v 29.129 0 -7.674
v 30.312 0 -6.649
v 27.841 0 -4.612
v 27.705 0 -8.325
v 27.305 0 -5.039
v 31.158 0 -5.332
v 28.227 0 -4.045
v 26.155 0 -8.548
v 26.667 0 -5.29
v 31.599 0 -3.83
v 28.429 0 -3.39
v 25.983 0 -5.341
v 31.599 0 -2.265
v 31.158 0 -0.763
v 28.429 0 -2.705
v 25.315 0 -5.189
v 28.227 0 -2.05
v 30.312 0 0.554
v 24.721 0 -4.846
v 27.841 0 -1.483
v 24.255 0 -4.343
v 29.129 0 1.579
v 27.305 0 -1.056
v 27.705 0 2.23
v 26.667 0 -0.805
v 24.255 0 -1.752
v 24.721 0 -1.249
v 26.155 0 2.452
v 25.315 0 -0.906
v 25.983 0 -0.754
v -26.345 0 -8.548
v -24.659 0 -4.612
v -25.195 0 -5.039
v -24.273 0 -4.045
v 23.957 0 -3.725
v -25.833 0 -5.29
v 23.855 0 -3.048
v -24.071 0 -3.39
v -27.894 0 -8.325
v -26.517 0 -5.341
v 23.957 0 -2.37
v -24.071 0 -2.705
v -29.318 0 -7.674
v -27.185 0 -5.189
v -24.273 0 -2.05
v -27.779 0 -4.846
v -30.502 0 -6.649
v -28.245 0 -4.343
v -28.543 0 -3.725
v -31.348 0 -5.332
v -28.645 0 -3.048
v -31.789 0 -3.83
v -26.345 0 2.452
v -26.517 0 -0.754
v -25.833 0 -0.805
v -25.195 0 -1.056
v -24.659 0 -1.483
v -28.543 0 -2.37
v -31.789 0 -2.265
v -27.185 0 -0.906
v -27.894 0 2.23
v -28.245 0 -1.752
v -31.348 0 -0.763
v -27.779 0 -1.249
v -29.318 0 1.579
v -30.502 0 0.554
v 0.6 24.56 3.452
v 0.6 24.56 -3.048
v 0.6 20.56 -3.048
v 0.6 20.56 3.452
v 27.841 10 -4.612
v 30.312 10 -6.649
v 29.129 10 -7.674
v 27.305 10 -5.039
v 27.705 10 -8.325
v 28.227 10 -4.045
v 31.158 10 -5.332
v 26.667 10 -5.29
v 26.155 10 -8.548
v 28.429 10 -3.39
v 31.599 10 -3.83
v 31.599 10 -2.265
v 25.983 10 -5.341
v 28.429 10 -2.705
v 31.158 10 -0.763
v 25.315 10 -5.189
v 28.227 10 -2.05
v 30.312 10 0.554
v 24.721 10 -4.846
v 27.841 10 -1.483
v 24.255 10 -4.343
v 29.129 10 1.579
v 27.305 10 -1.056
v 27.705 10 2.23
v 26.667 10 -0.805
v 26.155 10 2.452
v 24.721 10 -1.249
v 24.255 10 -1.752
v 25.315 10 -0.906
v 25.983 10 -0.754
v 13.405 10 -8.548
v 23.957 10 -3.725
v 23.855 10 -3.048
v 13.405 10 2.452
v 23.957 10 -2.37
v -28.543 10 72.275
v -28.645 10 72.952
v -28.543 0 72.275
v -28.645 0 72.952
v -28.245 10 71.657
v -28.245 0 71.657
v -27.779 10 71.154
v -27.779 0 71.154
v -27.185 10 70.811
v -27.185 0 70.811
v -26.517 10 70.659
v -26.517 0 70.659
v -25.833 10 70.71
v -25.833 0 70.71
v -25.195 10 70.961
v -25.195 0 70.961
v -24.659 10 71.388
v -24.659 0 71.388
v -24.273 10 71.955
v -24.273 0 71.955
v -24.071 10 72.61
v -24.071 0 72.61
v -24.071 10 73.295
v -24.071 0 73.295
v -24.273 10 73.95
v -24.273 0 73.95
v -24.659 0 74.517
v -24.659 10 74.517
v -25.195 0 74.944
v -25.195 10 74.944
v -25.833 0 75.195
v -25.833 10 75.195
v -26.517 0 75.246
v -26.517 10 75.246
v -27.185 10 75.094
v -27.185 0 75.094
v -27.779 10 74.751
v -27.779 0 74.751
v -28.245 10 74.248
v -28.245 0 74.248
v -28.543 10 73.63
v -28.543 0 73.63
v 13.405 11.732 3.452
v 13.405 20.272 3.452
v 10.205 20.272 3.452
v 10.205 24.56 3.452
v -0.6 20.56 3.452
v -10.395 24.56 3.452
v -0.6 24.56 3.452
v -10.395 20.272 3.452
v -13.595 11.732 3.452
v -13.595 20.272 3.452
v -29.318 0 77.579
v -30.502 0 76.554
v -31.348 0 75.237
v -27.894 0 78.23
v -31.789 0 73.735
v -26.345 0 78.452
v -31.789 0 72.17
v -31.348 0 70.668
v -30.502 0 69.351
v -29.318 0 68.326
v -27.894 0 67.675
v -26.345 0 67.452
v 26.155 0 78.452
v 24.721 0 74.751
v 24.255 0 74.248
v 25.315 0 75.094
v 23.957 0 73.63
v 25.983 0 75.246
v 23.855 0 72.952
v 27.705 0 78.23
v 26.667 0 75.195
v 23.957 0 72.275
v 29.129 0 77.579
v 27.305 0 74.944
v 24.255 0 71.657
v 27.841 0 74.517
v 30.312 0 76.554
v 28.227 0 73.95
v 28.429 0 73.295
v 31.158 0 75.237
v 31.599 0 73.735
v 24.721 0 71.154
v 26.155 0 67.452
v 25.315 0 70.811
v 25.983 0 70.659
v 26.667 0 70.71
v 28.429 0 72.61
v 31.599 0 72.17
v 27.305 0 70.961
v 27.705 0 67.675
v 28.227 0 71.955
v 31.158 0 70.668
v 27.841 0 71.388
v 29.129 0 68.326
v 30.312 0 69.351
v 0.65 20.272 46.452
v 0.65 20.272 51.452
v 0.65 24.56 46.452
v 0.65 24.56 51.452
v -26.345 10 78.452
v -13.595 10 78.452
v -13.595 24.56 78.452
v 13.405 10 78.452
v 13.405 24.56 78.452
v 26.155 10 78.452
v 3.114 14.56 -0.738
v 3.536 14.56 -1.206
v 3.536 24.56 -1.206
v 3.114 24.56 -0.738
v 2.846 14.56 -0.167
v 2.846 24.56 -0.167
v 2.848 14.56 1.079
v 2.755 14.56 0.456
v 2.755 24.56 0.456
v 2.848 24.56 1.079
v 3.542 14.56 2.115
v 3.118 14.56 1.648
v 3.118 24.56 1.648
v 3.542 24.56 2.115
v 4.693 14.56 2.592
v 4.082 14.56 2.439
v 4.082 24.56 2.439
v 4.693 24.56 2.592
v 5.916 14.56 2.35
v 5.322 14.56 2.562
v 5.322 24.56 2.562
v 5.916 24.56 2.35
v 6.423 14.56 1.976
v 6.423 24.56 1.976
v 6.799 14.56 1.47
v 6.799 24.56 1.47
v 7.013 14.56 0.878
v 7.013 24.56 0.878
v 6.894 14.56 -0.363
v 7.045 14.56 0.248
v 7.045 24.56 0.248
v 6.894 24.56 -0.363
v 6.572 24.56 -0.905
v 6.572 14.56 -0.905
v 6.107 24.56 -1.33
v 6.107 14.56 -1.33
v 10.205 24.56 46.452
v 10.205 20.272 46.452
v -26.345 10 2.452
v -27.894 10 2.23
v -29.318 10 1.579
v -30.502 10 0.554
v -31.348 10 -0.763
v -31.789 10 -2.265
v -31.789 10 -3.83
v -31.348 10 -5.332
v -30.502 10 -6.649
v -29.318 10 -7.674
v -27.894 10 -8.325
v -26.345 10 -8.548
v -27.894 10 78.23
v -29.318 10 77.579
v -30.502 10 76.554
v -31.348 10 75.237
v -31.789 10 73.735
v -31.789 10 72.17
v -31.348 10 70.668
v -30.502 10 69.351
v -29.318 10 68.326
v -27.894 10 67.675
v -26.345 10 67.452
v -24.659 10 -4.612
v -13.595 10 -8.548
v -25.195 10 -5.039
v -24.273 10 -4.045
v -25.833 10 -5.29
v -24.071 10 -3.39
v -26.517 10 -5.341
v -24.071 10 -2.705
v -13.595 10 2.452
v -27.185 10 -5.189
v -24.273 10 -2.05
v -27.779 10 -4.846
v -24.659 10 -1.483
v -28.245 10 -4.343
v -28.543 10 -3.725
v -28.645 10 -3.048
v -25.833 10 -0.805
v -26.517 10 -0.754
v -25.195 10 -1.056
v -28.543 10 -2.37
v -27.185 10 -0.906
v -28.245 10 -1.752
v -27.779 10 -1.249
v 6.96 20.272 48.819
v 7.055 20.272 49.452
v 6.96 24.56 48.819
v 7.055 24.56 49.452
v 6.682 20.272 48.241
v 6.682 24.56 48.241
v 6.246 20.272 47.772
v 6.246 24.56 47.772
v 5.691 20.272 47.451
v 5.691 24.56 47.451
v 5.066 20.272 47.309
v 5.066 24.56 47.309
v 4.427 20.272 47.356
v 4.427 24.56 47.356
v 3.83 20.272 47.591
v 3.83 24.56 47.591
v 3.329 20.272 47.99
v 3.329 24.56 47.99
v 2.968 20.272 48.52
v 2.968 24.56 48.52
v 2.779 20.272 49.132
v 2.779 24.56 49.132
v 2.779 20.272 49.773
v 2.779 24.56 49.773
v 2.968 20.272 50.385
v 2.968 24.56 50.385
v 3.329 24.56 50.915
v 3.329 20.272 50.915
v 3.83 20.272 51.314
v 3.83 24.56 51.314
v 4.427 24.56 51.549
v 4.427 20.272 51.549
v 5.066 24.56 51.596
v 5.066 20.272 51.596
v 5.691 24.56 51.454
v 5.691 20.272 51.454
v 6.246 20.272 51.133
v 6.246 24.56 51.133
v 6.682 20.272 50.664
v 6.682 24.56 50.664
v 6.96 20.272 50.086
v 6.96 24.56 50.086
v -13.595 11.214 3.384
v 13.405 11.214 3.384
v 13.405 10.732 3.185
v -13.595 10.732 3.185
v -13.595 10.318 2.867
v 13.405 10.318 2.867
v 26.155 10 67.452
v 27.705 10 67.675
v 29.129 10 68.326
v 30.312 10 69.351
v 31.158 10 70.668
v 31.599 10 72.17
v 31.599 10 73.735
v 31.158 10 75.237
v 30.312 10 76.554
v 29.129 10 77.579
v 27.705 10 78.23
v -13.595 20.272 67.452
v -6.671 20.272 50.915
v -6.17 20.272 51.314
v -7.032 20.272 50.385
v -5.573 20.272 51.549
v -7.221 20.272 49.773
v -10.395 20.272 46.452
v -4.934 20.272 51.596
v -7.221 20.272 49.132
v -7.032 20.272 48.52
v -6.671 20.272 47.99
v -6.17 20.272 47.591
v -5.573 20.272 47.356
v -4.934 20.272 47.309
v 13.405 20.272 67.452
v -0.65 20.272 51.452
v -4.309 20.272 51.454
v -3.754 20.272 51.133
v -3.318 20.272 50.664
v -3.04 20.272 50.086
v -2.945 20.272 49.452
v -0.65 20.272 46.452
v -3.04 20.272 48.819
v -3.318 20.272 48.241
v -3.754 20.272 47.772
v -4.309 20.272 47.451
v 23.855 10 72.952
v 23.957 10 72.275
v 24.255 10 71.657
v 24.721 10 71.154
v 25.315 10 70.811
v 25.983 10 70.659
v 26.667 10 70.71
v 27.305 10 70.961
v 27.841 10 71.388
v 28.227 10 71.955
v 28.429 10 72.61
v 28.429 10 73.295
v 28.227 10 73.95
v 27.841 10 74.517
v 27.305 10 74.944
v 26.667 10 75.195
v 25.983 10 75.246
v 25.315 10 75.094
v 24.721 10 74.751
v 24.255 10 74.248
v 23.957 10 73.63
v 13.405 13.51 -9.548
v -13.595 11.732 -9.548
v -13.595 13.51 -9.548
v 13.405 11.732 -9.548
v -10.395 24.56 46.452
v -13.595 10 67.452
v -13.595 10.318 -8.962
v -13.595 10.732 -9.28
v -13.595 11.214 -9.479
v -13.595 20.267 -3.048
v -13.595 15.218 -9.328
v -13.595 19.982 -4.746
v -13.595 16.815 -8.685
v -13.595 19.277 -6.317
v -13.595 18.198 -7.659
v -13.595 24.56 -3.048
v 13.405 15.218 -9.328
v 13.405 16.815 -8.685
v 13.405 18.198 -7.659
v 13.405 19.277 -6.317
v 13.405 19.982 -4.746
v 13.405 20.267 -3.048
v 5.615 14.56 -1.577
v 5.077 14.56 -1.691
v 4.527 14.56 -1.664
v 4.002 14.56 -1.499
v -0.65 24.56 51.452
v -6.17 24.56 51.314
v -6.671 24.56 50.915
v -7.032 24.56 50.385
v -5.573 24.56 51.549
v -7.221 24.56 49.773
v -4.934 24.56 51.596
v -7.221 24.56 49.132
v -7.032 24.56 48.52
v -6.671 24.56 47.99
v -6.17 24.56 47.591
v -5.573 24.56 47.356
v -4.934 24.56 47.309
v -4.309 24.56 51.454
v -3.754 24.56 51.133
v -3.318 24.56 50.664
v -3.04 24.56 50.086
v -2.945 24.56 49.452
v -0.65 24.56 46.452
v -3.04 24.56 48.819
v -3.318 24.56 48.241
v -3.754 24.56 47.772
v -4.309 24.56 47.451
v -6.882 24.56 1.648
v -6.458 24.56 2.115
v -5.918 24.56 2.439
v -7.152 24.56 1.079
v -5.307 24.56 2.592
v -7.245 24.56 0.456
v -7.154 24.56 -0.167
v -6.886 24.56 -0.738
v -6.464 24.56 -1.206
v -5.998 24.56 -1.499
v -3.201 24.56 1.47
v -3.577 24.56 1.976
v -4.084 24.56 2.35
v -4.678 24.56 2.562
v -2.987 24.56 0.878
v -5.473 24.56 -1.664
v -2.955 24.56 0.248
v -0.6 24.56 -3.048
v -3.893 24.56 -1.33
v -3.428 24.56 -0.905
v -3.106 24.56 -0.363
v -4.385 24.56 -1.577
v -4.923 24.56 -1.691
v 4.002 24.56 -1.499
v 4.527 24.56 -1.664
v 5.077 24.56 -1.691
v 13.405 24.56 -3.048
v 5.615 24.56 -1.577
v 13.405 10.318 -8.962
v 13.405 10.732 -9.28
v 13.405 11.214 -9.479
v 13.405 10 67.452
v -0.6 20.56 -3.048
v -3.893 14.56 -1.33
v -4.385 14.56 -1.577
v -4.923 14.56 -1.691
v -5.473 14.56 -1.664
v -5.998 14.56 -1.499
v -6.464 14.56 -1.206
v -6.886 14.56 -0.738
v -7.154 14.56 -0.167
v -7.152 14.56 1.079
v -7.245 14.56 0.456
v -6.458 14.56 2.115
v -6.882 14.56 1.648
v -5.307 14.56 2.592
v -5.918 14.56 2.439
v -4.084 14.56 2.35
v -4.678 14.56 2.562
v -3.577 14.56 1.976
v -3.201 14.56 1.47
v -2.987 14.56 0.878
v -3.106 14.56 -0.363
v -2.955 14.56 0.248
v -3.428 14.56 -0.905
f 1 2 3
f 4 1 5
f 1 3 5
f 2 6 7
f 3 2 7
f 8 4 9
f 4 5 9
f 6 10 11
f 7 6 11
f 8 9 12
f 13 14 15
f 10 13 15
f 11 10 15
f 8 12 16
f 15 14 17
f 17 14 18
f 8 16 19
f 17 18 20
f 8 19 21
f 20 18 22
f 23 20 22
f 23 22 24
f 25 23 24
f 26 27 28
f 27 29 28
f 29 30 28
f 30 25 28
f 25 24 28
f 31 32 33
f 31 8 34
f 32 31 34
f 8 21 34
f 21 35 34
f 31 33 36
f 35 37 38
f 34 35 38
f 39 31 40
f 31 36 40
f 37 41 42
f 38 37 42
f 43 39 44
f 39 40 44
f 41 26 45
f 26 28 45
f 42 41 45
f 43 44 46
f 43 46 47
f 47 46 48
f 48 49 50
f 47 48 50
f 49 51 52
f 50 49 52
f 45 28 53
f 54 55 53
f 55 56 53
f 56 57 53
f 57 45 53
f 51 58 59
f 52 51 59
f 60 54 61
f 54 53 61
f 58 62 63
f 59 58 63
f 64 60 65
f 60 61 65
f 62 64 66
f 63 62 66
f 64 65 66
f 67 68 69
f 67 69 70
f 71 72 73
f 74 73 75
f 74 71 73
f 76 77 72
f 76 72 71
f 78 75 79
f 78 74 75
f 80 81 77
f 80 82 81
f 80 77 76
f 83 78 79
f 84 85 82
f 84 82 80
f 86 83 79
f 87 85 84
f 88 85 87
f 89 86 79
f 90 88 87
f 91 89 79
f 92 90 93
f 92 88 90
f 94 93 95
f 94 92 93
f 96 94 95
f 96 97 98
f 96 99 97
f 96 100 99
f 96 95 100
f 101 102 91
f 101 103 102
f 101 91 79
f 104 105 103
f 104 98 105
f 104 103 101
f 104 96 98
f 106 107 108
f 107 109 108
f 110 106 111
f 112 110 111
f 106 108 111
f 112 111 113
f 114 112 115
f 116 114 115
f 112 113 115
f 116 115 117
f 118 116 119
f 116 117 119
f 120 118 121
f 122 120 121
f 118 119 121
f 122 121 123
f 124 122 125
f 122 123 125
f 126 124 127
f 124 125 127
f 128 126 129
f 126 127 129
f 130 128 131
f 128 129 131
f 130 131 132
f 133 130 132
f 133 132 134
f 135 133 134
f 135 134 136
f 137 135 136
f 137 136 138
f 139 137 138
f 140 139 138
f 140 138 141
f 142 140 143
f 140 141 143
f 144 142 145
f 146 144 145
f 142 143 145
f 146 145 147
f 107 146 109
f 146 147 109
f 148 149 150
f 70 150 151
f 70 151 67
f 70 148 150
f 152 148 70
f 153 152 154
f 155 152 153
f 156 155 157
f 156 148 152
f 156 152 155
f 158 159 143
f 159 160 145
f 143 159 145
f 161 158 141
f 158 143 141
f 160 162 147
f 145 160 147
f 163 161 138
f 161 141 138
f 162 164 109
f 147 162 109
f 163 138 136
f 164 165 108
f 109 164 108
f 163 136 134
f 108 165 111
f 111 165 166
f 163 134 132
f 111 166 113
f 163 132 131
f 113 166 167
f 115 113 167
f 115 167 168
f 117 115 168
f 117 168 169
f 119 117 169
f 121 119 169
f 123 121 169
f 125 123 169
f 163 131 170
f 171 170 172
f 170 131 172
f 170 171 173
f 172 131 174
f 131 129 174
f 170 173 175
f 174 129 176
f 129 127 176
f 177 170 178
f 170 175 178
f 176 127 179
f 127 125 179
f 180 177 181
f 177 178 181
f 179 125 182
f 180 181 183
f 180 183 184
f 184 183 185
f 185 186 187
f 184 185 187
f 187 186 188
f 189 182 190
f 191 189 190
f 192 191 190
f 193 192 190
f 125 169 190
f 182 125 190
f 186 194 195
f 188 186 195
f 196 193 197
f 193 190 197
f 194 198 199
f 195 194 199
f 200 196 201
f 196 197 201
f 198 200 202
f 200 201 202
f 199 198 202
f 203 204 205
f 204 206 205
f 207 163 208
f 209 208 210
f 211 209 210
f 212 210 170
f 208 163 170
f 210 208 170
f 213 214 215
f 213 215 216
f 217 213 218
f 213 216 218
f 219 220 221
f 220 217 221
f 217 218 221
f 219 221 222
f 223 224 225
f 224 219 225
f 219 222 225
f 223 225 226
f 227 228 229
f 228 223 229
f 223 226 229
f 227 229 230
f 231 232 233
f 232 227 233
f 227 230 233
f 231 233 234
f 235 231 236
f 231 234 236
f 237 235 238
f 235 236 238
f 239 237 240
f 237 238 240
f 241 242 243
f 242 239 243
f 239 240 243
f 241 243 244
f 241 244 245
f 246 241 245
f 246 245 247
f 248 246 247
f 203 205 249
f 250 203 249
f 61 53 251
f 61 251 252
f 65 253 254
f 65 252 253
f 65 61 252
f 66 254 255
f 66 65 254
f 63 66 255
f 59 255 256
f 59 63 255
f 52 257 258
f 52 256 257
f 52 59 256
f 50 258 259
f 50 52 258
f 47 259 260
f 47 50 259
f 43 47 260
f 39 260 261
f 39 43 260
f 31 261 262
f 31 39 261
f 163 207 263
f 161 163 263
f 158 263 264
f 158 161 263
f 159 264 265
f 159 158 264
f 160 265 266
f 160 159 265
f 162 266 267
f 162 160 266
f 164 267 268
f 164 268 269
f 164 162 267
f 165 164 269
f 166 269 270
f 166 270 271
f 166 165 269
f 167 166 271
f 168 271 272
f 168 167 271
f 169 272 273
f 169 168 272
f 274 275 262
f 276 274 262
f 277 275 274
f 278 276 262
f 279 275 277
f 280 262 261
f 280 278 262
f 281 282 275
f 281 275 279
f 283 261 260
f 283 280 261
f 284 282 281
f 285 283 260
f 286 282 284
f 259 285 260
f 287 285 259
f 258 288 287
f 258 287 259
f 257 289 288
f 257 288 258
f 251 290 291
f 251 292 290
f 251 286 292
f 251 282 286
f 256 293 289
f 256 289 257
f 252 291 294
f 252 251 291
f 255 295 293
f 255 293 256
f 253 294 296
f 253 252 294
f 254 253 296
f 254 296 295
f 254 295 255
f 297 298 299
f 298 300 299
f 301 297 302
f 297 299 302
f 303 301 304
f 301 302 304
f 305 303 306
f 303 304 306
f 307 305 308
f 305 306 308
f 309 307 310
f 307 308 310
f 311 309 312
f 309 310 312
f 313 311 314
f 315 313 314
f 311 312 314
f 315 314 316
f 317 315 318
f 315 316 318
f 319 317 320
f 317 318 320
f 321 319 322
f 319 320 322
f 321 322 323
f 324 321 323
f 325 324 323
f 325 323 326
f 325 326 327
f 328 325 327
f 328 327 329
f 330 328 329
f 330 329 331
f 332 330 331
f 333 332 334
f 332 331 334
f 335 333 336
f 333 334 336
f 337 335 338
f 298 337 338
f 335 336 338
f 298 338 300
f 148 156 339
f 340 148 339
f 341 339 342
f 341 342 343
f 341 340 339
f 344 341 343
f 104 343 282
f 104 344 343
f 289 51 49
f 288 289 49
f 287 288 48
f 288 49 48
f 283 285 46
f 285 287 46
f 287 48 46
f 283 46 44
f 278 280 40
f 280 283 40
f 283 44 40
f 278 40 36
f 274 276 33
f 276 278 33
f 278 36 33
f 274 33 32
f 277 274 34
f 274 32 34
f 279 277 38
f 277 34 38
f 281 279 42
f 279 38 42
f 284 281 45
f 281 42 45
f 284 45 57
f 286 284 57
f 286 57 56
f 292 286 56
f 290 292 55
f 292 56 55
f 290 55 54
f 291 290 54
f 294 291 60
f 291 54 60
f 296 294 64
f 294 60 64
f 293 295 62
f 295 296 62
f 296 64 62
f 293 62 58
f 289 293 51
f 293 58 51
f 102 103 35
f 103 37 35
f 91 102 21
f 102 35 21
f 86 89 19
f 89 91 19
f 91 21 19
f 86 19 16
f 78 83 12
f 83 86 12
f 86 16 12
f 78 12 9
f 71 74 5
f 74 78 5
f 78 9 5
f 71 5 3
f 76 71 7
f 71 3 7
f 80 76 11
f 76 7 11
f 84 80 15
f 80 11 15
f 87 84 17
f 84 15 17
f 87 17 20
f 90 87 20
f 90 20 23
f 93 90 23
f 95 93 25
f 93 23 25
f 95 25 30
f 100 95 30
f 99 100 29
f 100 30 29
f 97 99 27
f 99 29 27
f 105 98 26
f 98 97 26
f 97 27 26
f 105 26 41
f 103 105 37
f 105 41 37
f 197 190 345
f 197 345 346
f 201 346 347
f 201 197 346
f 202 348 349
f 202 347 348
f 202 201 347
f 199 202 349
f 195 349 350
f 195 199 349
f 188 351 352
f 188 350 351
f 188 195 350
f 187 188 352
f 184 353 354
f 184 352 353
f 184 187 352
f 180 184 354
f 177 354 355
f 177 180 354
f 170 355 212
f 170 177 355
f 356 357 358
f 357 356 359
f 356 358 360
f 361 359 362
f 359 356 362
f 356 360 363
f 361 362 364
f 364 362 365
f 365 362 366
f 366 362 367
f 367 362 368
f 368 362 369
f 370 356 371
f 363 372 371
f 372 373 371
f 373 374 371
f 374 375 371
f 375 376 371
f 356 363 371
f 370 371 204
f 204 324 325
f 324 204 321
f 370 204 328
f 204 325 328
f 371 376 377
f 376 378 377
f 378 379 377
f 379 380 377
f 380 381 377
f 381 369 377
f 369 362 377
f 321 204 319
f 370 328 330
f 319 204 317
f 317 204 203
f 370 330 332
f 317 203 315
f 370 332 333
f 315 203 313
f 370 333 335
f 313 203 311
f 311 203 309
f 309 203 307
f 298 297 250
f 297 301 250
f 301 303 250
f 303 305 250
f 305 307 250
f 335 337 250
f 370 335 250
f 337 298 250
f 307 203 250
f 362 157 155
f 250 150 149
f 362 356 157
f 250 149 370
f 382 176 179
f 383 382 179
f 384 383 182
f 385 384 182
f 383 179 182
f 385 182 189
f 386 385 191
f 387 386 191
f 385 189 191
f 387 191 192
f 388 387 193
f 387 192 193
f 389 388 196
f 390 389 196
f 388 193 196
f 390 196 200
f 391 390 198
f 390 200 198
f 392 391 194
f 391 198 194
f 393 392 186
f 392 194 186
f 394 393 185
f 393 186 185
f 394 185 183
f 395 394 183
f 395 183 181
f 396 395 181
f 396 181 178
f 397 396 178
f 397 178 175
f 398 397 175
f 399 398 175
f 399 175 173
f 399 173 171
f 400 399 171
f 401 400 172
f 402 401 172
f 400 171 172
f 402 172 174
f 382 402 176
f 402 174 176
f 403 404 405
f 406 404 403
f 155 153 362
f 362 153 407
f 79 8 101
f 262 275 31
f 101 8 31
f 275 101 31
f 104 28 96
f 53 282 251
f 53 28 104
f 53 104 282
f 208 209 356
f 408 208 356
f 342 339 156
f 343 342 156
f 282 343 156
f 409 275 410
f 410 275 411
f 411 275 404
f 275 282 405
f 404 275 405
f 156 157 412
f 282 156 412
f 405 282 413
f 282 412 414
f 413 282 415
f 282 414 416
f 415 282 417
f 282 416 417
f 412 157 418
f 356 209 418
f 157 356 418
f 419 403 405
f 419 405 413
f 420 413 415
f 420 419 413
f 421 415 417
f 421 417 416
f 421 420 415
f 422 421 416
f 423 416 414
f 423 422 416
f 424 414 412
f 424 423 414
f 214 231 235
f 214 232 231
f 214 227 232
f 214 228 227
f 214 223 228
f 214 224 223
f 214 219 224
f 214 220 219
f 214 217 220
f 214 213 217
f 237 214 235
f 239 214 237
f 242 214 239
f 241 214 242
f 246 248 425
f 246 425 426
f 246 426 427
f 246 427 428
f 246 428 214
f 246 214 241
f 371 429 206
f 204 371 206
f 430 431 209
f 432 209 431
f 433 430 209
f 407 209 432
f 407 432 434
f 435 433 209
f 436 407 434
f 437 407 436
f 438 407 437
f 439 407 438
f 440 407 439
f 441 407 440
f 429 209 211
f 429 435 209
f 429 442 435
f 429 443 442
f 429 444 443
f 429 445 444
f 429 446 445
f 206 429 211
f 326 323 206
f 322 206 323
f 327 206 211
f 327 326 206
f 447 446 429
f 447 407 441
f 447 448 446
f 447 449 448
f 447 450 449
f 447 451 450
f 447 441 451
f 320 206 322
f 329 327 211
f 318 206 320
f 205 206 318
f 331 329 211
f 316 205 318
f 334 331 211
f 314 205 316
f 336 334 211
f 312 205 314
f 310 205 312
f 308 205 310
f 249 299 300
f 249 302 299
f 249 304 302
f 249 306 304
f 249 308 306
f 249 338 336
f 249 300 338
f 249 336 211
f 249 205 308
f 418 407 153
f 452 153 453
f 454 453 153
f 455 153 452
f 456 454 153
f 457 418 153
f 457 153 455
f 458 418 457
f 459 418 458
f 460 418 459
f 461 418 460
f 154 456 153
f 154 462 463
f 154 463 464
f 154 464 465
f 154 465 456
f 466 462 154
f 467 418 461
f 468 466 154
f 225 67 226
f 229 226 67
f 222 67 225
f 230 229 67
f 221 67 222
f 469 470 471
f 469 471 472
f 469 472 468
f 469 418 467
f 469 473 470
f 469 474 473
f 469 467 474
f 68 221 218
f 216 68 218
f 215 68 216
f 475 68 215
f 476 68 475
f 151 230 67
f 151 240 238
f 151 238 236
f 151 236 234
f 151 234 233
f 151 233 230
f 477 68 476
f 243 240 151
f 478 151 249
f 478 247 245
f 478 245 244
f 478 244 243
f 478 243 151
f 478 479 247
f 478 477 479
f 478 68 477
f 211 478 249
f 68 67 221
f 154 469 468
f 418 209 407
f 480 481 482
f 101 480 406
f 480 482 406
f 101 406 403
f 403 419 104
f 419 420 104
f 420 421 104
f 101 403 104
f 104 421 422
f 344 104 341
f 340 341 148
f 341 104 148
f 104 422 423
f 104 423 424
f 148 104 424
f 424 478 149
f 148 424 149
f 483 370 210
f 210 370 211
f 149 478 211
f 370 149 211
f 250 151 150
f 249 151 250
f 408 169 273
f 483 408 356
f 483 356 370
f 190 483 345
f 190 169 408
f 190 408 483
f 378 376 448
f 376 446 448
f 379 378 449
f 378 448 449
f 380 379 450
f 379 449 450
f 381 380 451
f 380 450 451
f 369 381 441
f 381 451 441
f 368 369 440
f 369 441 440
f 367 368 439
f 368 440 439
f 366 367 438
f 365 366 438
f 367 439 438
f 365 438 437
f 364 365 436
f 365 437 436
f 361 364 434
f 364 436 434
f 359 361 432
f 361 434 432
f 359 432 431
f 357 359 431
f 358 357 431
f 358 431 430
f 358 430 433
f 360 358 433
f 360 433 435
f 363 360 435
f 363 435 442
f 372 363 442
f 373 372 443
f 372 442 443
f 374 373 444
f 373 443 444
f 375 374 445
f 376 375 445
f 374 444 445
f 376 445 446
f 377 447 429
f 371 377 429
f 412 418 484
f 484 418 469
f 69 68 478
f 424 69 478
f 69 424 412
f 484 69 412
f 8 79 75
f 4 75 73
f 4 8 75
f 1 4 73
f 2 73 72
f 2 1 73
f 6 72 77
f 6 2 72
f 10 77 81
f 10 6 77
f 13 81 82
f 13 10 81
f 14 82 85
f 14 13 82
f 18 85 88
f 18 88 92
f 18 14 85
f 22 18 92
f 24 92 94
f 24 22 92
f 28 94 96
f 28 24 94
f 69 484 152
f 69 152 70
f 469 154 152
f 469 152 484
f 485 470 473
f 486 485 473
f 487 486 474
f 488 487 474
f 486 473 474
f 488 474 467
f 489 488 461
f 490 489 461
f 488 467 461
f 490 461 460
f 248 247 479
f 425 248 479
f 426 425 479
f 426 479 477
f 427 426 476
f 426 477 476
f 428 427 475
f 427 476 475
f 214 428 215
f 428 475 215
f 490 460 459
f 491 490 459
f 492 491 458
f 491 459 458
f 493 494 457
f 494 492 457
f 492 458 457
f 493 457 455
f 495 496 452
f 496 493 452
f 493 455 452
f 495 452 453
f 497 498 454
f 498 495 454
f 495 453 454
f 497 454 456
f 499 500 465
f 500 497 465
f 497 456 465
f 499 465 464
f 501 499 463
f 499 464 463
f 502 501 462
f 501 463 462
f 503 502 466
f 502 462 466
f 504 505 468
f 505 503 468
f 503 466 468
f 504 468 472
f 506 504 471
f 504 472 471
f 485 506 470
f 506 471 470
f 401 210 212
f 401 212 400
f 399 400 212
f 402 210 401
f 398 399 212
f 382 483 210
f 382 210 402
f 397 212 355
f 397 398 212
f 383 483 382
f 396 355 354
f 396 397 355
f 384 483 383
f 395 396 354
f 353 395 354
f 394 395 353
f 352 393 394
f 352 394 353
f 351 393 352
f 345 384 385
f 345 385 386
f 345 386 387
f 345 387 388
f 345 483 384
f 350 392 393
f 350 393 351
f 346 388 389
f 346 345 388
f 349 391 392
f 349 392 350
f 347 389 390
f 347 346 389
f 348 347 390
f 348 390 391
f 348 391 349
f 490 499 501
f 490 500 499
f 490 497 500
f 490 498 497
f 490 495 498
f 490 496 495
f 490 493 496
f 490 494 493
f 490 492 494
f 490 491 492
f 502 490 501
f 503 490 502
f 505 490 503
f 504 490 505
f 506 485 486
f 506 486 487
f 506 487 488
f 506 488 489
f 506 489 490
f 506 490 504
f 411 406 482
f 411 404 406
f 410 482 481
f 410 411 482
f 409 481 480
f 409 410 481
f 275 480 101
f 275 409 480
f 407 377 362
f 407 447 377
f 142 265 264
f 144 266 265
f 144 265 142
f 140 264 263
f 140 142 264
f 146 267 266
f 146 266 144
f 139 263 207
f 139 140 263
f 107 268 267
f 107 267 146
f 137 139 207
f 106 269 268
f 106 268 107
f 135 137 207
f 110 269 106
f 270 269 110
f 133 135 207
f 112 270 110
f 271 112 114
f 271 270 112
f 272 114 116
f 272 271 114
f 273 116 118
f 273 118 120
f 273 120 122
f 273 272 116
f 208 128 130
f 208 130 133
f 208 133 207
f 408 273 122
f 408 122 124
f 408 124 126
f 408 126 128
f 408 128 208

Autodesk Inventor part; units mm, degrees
ref_plane "YZ Plane" through (0, 0, 0) normal (1, 0, 0) x (0, 1, 0)
ref_plane "XZ Plane" through (0, 0, 0) normal (0, 1, 0) x (-1, 0, 0)
ref_plane "XY Plane" through (0, 0, 0) normal (0, 0, 1) x (1, 0, 0)
sketch "Sketch1" plane through (0, 0, 0) normal (0, 1, 0) x (-1, 0, 0)
  circle A0 centre (-26.1551, -3.0475) radius 2.3
  arc A1 (-34.9051, -0.0475) -> (-17.4051, -0.0475) centre (-26.1551, -0.0475) ccw
  arc A2 (17.5949, -0.0475) -> (35.0949, -0.0475) centre (26.3449, -0.0475) ccw
  circle A3 centre (26.3449, -3.0475) radius 2.3
  circle A4 centre (-26.1551, -3.0475) radius 2.3
  circle A5 centre (26.3449, -3.0475) radius 2.3
  circle A6 centre (26.3449, -0.0475) radius 8.75
  circle A7 centre (-26.1551, -0.0475) radius 8.75
  line L0 (-34.9051, -0.0475) -> (-17.4051, -0.0475)
  line L1 (17.5949, -0.0475) -> (35.0949, -0.0475)
  circle A8 centre (-26.1551, -3.0475) radius 5.5
  circle A9 centre (26.3449, -3.0475) radius 5.5
  line L2 (-26.1551, -8.5475) -> (26.3449, -8.5475)
  line L3 (-26.1551, 2.4525) -> (26.3449, 2.4525)
  point P0 (0, 0)
  dimension "d0" = 11
  dimension "d1" = 11
  dimension "d41" = 4.6
  dimension "d42" = 4.6
extrude "Extrusion1" add sketch "Sketch1" along normal blind 10 contours L2 A8 L0 A1 | A1 A7 L3 A6 A2 L2 | A7 L0 A8 L3 | A8 L0 | L0 A8 | A2 L1 A9 L2 | L3 A9 L1 A6 | A9 L1 | A9 L1 picked at (-18.6939, -1.0014) picked at (-20.5799, 1.133) picked at (18.8536, -1.0809) picked at (20.7697, 1.133)
sketch "Sketch2" plane through (0, 10, 0) normal (0, 1, 0) x (1, 0, 0)
  line L0 (26.1551, 8.5475) -> (-26.3449, 8.5475) projected
  line L1 (-26.3449, -2.4525) -> (26.1551, -2.4525) projected
  arc A0 (-26.3449, 8.5475) -> (-26.3449, -2.4525) centre (-26.3449, 3.0475) ccw projected
  arc A1 (26.1551, -2.4525) -> (26.1551, 8.5475) centre (26.1551, 3.0475) ccw projected
  line L2 (-31.8449, 3.0475) -> (31.6551, 3.0475)
  line L3 (13.4051, -3.4525) -> (-13.5949, -3.4525)
  line L4 (-13.5949, -3.4525) -> (-13.5949, 9.5475)
  line L5 (-13.5949, 9.5475) -> (13.4051, 9.5475)
  line L6 (13.4051, 9.5475) -> (13.4051, -3.4525)
  line L7 (13.4051, -3.4525) -> (-13.5949, 9.5475) construction
  line L8 (-13.5949, -3.4525) -> (13.4051, 9.5475) construction
  point P0 (0, 0)
  point P1 (-0.0949, 3.0475)
  dimension "d4" = 27
  dimension "d5" = 13
extrude "Extrusion2" add sketch "Sketch2" along normal blind 14.56 contours L6 L2 L4 L0 | L0 L4 L5 L6 | L6 L1 L4 L2 | L6 L3 L4 L1
fillet "Fillet1" radius 2 2 edges at (-0.0949, 10, 3.4525) (-0.0949, 10, -9.5475)
sketch "Sketch3" plane through (0, 24.56, 0) normal (0, 1, 0) x (1, 0, 0)
  arc A0 (-6.4637, 1.2055) -> (-3.8927, 1.3299) centre (-5.0949, -0.4525) ccw
  arc A1 (3.5363, 1.2055) -> (6.1073, 1.3299) centre (4.9051, -0.4525) ccw
  circle A2 centre (4.9051, -0.4525) radius 2.15
  circle A3 centre (-5.0949, -0.4525) radius 2.15
  line L0 (-13.5949, 9.5475) -> (-13.5949, -3.4525) projected
  line L1 (13.4051, 9.5475) -> (-13.5949, 9.5475) projected
  line L2 (-13.5949, -3.4525) -> (13.4051, -3.4525) projected
  line L3 (13.4051, -3.4525) -> (13.4051, 9.5475) projected
  point P0 (0, 0)
  point P1 (6.1073, 1.3299)
  point P2 (3.5363, 1.2055)
  point P3 (-3.8927, 1.3299)
  point P4 (-6.4637, 1.2055)
  dimension "d12" = 8.5
  dimension "d13" = 8.5
  dimension "d43" = 2.15
  dimension "d44" = 2.15
extrude "Extrusion3" cut sketch "Sketch3" against normal blind 10 contours A3 A0 | A2 A1
sketch "Sketch4" plane through (0, 24.56, 0) normal (0, 1, 0) x (1, 0, 0)
  line L0 (13.4051, 9.5475) -> (-13.5949, 9.5475) projected
  line L1 (-13.5949, -2.4525) -> (-13.5949, 8.5475) projected
  line L2 (13.4051, 9.5475) -> (-13.5949, 9.5475)
  line L3 (-13.5949, 9.5475) -> (-13.5949, 3.0475)
  line L4 (-13.5949, 3.0475) -> (13.4051, 3.0475)
  line L5 (13.4051, 3.0475) -> (13.4051, 9.5475)
  point P0 (0, 0)
extrude "Extrusion4" cut sketch "Sketch4" against normal blind 4.2875
fillet "Fillet2" radius 6.7625 1 edges at (-0.0949, 20.2725, -9.5475)
sketch "Sketch5" plane through (0, 24.56, 0) normal (0, 1, 0) x (1, 0, 0)
  line L0 (-13.5949, -3.4525) -> (13.4051, -3.4525) projected
  line L1 (-10.3949, -3.4525) -> (-10.3949, -67.4525)
  line L2 (10.2051, -3.4525) -> (10.2051, -67.4525)
  line L3 (-13.5949, 3.0475) -> (-13.5949, -3.4525) projected
  circle A0 centre (-5.0949, -49.4525) radius 2.15
  line L4 (13.4051, -3.4525) -> (13.4051, 3.0475) projected
  circle A1 centre (4.9051, -49.4525) radius 2.15
  circle A2 centre (4.9051, -49.4525) radius 3
  circle A3 centre (-5.0949, -49.4525) radius 3
  line L5 (-10.3949, -67.4525) -> (10.2051, -67.4525)
  line L6 (-10.3949, -67.4525) -> (-13.5949, -67.4525)
  line L7 (-13.5949, -67.4525) -> (-13.5949, -3.4525)
  line L8 (10.2051, -67.4525) -> (13.4051, -67.4525)
  line L9 (13.4051, -67.4525) -> (13.4051, -3.4525)
  line L10 (-5.0949, -46.4525) -> (4.9051, -46.4525)
  line L11 (10.2051, -46.4525) -> (-10.3949, -46.4525)
  line L12 (-0.65, -46.4525) -> (-0.65, -51.4525)
  line L13 (-0.65, -51.4525) -> (0.65, -51.4525)
  line L14 (0.65, -51.4525) -> (0.65, -46.4525)
  line L15 (0, -46.4525) -> (-0.65, -51.4525) construction
  line L16 (0, -46.4525) -> (0.65, -51.4525) construction
  point P0 (0, 0)
  point P1 (13.4051, -0.2025)
  point P2 (4.9051, -46.4525)
  dimension "d28" = 6
  dimension "d29" = 6
  dimension "d19" = 3.2
  dimension "d20" = 64
  dimension "d21" = 3.2
  dimension "d22" = 64
  dimension "d23" = 46
  dimension "d24" = 8.5
  dimension "d25" = 4.3
  dimension "d26" = 8.5
  dimension "d27" = 4.3
  dimension "d30" = 1.3
extrude "Extrusion5" add sketch "Sketch5" against normal blind 4.2875 contours L0 L1 L6 L7 | L0 L9 L8 L2 | A2 | A3 | L11 L10 L12 L13 L14 L2 L5 L1
sketch "Sketch6" plane through (0, 24.56, 0) normal (0, 1, 0) x (1, 0, 0)
  line L0 (13.4051, -67.4525) -> (-13.5949, -67.4525) projected
  line L1 (-13.5949, -67.4525) -> (13.4051, -67.4525)
  line L2 (13.4051, -67.4525) -> (13.4051, -78.4525)
  line L3 (13.4051, -78.4525) -> (-13.5949, -78.4525)
  line L4 (-13.5949, -78.4525) -> (-13.5949, -67.4525)
  circle A0 centre (26.1551, 3.0475) radius 2.3 projected
  circle A1 centre (-26.3449, 3.0475) radius 2.3 projected
  point P0 (0, 0)
  dimension "d34" = 11
extrude "Extrusion6" add sketch "Sketch6" against normal up to surface (14.56 mm away) contours L2 L3 L4 L0
ref_plane "Work Plane1" through (-13.5949, 24.56, 34.9525) normal (0, 0, 1) x (1, 0, 0)
sketch "Sketch7" plane through (0, 24.56, 0) normal (0, 1, 0) x (1, 0, 0)
  point P0 (0, 0)
mirror "Mirror1" about plane through (-13.5949, 24.56, 34.9525) normal (0, 0, 1) of "Extrusion1"
sketch "Sketch8" plane through (0, 24.56, 0) normal (0, 1, 0) x (1, 0, 0)
  line L0 (0.6, -3.9565) -> (-0.6, -3.9565)
  line L1 (-0.6, -3.9565) -> (-0.6, 3.9565)
  line L2 (-0.6, 3.9565) -> (0.6, 3.9565)
  line L3 (0.6, 3.9565) -> (0.6, -3.9565)
  line L4 (0.6, -3.9565) -> (-0.6, 3.9565) construction
  line L5 (-0.6, -3.9565) -> (0.6, 3.9565) construction
  point P0 (0, 0)
  dimension "d38" = 1.2
extrude "Extrusion7" cut sketch "Sketch8" against normal blind 4
properties part number "SERVO_MOUNT_TOBASE"
